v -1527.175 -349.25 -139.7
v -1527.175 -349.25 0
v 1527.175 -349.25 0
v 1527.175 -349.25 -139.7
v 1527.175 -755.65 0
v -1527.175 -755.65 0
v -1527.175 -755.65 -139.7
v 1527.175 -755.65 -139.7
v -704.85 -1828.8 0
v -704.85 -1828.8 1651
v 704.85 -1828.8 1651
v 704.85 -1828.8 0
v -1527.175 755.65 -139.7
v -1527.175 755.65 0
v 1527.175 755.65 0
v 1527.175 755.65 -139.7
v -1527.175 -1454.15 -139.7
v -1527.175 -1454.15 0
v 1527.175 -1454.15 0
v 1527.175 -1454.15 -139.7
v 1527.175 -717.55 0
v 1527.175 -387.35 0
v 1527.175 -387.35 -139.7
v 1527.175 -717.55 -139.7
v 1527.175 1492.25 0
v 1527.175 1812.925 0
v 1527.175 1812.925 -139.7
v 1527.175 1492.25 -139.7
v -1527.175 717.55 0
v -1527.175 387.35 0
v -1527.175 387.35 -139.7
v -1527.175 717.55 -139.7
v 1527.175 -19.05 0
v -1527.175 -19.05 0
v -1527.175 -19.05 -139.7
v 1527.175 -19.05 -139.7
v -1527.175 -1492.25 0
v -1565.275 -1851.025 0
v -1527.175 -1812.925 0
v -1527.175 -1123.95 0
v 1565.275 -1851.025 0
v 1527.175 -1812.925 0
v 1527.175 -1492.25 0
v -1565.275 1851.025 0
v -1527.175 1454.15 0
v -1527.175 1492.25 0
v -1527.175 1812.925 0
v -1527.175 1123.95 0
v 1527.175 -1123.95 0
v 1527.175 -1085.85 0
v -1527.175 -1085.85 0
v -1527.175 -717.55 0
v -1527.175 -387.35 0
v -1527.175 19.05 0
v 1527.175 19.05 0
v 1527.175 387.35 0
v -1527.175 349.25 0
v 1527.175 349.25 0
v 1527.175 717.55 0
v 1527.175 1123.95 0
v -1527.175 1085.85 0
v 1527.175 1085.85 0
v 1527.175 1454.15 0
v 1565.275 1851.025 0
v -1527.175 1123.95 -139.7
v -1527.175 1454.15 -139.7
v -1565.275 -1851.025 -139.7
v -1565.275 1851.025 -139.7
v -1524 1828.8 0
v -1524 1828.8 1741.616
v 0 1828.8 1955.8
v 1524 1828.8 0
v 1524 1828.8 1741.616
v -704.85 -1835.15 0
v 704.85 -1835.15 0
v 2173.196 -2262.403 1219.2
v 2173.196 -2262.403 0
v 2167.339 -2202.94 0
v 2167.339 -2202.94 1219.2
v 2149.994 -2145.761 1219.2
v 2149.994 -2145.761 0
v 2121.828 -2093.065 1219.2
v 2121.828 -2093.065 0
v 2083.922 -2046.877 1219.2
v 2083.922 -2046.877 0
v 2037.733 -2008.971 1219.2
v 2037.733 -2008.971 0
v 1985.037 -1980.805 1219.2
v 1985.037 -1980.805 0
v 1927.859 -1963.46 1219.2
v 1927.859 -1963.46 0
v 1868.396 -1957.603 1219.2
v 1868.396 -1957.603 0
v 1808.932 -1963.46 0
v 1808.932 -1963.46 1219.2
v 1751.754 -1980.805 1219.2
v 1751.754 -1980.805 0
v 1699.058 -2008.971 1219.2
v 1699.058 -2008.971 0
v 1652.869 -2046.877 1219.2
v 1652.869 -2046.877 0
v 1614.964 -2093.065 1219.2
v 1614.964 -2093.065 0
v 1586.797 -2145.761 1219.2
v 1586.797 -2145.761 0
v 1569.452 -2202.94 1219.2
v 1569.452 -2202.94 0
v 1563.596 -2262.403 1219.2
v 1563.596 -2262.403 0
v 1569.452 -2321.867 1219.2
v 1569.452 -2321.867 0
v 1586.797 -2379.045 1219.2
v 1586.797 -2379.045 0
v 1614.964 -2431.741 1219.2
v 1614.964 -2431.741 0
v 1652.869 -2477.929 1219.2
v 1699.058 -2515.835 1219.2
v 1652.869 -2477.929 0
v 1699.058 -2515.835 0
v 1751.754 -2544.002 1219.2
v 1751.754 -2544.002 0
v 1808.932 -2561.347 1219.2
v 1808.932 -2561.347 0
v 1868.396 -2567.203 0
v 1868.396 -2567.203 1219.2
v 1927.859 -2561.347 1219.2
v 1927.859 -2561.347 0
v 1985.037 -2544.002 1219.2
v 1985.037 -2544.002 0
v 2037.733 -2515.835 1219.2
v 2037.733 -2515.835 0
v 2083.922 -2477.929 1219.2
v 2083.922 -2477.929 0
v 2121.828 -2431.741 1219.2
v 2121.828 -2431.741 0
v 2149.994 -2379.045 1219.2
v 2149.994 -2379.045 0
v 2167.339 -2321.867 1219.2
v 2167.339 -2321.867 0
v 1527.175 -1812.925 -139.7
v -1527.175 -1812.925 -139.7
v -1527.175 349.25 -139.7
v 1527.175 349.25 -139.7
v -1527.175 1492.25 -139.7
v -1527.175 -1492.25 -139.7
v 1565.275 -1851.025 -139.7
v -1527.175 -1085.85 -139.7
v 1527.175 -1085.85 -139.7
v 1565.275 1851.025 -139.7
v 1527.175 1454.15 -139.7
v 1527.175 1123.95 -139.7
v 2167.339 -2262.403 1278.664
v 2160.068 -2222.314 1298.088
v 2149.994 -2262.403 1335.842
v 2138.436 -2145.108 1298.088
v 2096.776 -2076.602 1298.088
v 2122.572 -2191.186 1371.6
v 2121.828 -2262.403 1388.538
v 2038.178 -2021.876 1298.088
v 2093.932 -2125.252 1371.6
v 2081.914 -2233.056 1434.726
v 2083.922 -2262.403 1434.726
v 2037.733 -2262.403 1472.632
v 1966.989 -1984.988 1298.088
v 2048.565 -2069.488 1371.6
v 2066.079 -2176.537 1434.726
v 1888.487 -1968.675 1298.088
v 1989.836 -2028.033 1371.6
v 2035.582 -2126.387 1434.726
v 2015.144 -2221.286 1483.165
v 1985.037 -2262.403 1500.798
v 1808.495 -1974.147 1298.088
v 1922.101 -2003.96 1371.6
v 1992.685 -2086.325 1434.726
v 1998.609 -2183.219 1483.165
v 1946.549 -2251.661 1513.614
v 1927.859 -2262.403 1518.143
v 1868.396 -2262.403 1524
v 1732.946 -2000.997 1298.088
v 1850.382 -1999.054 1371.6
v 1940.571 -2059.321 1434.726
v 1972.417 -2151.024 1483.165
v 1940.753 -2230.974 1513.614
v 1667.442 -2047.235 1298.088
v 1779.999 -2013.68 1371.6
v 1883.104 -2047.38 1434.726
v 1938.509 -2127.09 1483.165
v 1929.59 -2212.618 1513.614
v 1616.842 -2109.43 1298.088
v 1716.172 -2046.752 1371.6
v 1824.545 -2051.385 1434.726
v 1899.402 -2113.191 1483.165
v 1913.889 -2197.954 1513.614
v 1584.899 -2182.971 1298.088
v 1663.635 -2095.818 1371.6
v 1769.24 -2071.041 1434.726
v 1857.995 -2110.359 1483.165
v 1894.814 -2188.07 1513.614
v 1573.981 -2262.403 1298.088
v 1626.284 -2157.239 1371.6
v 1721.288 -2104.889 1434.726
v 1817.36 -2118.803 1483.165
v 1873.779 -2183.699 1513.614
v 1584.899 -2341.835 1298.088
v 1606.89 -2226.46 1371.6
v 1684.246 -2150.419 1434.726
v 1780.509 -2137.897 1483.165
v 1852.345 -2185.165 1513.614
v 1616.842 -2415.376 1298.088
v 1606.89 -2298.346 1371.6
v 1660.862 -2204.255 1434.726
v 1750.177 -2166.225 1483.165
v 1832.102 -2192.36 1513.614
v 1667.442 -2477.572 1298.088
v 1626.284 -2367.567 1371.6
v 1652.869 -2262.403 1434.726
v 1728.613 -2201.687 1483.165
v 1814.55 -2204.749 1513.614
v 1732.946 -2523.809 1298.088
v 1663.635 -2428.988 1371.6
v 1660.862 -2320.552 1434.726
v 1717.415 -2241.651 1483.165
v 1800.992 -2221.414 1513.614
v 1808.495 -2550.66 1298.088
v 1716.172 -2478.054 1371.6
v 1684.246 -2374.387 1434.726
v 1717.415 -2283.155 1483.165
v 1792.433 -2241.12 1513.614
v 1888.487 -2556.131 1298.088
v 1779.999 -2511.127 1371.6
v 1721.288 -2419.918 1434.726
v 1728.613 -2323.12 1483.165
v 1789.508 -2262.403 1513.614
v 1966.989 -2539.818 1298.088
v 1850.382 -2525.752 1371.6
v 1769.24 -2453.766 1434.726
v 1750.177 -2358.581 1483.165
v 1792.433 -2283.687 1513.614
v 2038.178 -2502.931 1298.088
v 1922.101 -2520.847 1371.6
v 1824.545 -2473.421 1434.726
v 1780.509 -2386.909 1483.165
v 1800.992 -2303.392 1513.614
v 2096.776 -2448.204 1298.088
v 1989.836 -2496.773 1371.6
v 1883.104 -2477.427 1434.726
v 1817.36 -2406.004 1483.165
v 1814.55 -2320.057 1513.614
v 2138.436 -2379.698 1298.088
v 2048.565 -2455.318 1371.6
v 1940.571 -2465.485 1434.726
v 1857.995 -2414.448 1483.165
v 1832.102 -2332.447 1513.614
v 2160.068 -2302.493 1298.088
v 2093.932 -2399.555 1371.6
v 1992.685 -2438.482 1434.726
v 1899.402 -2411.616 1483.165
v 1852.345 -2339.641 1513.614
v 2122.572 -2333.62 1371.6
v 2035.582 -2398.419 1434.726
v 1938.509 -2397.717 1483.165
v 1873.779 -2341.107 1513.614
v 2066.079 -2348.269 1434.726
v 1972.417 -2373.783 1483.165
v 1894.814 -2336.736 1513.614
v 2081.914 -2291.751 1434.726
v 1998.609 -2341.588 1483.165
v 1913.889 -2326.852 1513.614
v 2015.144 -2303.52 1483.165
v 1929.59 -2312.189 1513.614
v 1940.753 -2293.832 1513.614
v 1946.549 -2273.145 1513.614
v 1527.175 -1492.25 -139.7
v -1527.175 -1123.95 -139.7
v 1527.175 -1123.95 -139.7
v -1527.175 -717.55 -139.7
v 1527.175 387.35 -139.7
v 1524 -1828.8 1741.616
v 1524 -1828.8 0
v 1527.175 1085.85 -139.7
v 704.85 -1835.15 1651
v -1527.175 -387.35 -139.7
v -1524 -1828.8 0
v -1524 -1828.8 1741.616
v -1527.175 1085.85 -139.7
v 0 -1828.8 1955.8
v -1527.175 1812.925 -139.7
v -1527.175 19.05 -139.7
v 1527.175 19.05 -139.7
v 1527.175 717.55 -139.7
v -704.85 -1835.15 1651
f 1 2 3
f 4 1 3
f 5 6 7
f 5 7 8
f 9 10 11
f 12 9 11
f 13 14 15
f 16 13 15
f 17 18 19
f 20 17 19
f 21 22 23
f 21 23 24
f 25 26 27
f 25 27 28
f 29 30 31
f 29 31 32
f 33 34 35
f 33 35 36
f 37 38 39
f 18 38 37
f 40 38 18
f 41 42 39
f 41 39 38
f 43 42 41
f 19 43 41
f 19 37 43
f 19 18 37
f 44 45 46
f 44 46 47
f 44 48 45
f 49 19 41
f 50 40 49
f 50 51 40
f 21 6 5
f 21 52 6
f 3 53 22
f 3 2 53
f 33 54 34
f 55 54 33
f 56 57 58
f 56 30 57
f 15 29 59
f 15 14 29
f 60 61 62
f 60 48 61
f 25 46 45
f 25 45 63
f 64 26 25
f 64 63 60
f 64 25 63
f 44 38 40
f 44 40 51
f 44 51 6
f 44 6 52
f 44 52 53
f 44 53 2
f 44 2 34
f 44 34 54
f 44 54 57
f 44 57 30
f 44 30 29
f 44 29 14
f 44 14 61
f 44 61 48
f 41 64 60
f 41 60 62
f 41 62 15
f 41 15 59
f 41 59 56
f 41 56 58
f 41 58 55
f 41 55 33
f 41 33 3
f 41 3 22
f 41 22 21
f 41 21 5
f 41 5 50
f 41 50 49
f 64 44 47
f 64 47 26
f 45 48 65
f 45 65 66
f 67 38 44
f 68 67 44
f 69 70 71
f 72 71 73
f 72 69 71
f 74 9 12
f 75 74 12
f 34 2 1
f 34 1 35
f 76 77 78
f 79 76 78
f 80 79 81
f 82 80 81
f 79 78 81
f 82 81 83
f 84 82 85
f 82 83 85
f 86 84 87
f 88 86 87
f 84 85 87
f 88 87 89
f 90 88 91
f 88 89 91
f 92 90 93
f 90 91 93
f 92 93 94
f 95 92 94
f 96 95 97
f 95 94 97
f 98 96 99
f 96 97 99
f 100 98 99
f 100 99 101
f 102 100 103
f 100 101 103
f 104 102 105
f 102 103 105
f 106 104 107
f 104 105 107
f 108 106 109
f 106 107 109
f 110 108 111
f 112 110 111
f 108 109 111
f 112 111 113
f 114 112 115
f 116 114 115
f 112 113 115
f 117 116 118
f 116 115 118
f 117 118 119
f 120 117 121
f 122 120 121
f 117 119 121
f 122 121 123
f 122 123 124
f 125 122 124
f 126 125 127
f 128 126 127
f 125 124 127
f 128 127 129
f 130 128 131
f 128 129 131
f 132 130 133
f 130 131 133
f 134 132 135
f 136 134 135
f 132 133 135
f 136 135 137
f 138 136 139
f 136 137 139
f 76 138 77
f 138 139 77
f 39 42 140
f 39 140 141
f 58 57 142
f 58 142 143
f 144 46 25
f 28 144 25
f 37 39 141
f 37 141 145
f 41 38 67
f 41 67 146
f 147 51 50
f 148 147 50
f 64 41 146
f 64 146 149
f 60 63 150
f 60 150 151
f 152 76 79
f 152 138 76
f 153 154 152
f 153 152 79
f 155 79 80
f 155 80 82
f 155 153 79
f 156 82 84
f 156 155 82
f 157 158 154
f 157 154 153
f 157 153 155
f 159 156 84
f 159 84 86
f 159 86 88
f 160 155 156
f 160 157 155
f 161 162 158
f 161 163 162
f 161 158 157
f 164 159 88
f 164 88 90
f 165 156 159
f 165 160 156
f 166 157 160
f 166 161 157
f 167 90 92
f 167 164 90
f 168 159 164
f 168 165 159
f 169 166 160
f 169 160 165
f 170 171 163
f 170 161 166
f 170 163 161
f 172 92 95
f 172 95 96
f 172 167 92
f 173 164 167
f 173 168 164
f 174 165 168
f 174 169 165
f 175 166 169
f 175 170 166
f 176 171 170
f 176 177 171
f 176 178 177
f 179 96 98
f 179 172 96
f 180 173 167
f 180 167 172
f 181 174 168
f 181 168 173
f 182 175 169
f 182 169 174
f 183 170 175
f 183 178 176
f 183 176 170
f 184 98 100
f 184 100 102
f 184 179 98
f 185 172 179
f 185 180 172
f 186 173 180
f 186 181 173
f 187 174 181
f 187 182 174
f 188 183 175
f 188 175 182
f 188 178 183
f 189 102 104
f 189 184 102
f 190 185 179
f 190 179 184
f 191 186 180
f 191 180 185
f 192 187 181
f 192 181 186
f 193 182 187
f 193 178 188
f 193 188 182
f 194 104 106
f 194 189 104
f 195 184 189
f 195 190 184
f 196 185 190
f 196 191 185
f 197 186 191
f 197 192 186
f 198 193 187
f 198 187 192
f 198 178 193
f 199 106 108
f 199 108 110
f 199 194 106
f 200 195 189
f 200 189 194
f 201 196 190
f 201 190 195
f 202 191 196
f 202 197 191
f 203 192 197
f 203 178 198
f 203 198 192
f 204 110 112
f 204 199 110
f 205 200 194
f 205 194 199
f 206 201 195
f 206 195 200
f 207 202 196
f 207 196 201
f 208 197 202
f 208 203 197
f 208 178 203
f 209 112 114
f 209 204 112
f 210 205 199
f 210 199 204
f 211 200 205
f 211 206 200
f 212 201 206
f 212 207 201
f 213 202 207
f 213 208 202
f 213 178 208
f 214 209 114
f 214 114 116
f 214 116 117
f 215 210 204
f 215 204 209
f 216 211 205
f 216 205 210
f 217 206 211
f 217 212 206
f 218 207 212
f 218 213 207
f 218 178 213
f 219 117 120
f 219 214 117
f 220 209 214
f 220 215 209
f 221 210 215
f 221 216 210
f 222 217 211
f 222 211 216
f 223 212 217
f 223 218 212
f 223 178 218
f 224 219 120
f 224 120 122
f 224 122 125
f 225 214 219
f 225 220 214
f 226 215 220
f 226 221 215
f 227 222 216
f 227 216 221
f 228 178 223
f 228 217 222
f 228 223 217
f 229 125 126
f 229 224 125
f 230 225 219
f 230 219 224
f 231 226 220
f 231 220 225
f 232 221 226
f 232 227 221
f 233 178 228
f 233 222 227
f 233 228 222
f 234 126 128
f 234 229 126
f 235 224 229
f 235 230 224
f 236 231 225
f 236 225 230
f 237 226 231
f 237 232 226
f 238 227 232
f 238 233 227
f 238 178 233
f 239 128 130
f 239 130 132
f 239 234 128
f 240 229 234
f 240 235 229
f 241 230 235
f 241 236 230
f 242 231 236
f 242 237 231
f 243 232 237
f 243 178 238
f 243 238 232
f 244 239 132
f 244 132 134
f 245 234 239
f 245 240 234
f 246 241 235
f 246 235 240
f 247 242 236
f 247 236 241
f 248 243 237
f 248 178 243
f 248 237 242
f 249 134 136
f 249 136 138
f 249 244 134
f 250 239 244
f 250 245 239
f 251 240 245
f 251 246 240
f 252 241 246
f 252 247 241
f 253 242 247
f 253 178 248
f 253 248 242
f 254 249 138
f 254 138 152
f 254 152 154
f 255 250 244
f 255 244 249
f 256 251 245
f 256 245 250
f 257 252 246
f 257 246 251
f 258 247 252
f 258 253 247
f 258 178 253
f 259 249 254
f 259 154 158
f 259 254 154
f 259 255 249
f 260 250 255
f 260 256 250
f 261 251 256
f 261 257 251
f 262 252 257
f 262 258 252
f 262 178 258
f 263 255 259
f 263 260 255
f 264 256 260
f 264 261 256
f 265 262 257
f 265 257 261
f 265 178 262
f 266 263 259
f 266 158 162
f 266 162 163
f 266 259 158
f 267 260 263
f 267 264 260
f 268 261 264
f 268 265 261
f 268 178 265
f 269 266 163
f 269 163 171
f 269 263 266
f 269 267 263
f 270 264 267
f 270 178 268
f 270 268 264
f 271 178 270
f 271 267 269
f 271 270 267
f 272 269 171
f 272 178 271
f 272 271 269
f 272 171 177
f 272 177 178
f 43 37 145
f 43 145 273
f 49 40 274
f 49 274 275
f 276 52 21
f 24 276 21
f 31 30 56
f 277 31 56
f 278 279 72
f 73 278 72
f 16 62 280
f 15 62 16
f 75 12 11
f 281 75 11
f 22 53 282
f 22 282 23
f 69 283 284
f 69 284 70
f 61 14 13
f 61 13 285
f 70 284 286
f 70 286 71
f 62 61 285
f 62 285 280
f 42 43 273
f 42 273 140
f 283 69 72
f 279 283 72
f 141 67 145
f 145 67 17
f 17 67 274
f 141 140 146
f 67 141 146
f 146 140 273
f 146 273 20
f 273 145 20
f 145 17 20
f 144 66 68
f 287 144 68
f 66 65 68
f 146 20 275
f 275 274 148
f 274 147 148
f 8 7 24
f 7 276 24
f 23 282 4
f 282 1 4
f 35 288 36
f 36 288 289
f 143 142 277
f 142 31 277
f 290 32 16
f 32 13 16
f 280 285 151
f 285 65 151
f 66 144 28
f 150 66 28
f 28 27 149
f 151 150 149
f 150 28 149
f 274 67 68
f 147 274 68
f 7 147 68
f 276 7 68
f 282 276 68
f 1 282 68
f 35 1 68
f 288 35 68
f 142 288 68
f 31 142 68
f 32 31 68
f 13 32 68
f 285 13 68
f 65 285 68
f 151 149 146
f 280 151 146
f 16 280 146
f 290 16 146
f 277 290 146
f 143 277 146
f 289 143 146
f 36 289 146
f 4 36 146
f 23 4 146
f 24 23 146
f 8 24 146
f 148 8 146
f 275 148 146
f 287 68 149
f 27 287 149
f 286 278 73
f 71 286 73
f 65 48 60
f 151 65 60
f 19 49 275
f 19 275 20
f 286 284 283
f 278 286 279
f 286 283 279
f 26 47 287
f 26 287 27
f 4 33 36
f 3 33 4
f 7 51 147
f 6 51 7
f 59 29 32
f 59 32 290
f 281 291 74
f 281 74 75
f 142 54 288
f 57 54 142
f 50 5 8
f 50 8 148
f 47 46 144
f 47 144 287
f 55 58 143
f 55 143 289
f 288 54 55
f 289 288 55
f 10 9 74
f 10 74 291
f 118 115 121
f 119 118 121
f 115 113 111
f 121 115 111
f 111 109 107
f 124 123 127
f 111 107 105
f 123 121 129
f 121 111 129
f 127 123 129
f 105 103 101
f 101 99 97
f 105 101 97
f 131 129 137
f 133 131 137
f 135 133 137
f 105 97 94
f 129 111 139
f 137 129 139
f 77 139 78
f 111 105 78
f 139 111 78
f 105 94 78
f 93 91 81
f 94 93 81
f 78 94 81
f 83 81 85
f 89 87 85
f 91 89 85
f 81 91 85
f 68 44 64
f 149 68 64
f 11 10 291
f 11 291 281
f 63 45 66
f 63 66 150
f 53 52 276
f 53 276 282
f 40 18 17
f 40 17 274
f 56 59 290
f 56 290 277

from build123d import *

# Parameters (mm, degrees)
F0_W     = 3130.55
F0_H     = 3702.05
F0_W_2   = 3054.35
F0_H_2   = 38.1
F1_DEPTH = 139.7
F2_W     = 3048
F2_H     = 3657.6
F3_DEPTH = 1955.8
F4_SIZE2 = 214.184222
F4_SIZE  = 1523.99999
F5_W     = 1409.7
F5_H     = 1651
F6_DEPTH = 6.35
F7_R     = 304.8
F8_DEPTH = 1524
F9_R     = 304.8


# Not quite as in the source:
# - a fillet or chamfer is up to 0.001 mm smaller than in the source, because OpenCascade refuses the exact size


with BuildPart() as f1:
    # F0 (on Top) → F1 (new body)
    with BuildSketch(Plane.XY):
        Rectangle(F0_W, F0_H)
        Polygon((1527.175, -1492.25), (1527.175, -1812.925), (-1527.175, -1812.925), (-1527.175, -1492.25), (-1527.175, -1454.15), (-1527.175, -1123.95), (-1527.175, -1085.85), (-1527.175, -755.65), (-1527.175, -717.55), (-1527.175, -387.35), (-1527.175, -349.25), (-1527.175, -19.05), (-1527.175, 19.05), (-1527.175, 349.25), (-1527.175, 387.35), (-1527.175, 717.55), (-1527.175, 755.65), (-1527.175, 1085.85), (-1527.175, 1123.95), (-1527.175, 1454.15), (-1527.175, 1492.25), (-1527.175, 1812.925), (1527.175, 1812.925), (1527.175, 1492.25), (1527.175, 1454.15), (1527.175, 1123.95), (1527.175, 1085.85), (1527.175, 755.65), (1527.175, 717.55), (1527.175, 387.35), (1527.175, 349.25), (1527.175, 19.05), (1527.175, -19.05), (1527.175, -349.25), (1527.175, -387.35), (1527.175, -717.55), (1527.175, -755.65), (1527.175, -1085.85), (1527.175, -1123.95), (1527.175, -1454.15), align=None, mode=Mode.SUBTRACT)
        with Locations((0, -368.3)):
            Rectangle(F0_W_2, F0_H_2)
        with Locations((0, -736.6)):
            Rectangle(F0_W_2, F0_H_2)
        with Locations((0, -1104.9)):
            Rectangle(F0_W_2, F0_H_2)
        with Locations((0, -1473.2)):
            Rectangle(F0_W_2, F0_H_2)
        Rectangle(F0_W_2, F0_H_2)
        with Locations((0, 368.3)):
            Rectangle(F0_W_2, F0_H_2)
        with Locations((0, 736.6)):
            Rectangle(F0_W_2, F0_H_2)
        with Locations((0, 1104.9)):
            Rectangle(F0_W_2, F0_H_2)
        with Locations((0, 1473.2)):
            Rectangle(F0_W_2, F0_H_2)
    extrude(amount=-F1_DEPTH)


with BuildPart() as f3:
    # F2 (on Top) → F3 (new body)
    with BuildSketch(Plane.XY):
        Rectangle(F2_W, F2_H)
    extrude(amount=F3_DEPTH)

    # F4 (size 1524 and 214.1842320864 in the source; OpenCascade refuses exactly that, so slightly less here)
    f4_edges = [f3.edges().sort_by_distance(p)[0] for p in [
        (1524, 0, 1955.8),
        (-1524, 0, 1955.8),
    ]]
    f4_side = f3.faces().sort_by_distance((0, 0, 1955.8))[0]
    chamfer(f4_edges, length=F4_SIZE, length2=F4_SIZE2, reference=f4_side)


with BuildPart() as f6:
    # F5 (on face) → F6 (new body)
    with BuildSketch(Plane.XZ.offset(1828.8)):
        with Locations((0, 825.5)):
            Rectangle(F5_W, F5_H)
    extrude(amount=F6_DEPTH)


with BuildPart() as f8:
    # F7 (on Top) → F8 (new body)
    with BuildSketch(Plane.XY):
        with Locations((1868.3955669403, -2262.4032497406)):
            Circle(F7_R)
    extrude(amount=F8_DEPTH)

    # F9
    f9_edges = [f8.edges().sort_by_distance(p)[0] for p in [
        (1563.595567, -2262.40325, 1524),
    ]]
    fillet(f9_edges, radius=F9_R)


solid = Compound([f1.part, f3.part, f6.part, f8.part])
